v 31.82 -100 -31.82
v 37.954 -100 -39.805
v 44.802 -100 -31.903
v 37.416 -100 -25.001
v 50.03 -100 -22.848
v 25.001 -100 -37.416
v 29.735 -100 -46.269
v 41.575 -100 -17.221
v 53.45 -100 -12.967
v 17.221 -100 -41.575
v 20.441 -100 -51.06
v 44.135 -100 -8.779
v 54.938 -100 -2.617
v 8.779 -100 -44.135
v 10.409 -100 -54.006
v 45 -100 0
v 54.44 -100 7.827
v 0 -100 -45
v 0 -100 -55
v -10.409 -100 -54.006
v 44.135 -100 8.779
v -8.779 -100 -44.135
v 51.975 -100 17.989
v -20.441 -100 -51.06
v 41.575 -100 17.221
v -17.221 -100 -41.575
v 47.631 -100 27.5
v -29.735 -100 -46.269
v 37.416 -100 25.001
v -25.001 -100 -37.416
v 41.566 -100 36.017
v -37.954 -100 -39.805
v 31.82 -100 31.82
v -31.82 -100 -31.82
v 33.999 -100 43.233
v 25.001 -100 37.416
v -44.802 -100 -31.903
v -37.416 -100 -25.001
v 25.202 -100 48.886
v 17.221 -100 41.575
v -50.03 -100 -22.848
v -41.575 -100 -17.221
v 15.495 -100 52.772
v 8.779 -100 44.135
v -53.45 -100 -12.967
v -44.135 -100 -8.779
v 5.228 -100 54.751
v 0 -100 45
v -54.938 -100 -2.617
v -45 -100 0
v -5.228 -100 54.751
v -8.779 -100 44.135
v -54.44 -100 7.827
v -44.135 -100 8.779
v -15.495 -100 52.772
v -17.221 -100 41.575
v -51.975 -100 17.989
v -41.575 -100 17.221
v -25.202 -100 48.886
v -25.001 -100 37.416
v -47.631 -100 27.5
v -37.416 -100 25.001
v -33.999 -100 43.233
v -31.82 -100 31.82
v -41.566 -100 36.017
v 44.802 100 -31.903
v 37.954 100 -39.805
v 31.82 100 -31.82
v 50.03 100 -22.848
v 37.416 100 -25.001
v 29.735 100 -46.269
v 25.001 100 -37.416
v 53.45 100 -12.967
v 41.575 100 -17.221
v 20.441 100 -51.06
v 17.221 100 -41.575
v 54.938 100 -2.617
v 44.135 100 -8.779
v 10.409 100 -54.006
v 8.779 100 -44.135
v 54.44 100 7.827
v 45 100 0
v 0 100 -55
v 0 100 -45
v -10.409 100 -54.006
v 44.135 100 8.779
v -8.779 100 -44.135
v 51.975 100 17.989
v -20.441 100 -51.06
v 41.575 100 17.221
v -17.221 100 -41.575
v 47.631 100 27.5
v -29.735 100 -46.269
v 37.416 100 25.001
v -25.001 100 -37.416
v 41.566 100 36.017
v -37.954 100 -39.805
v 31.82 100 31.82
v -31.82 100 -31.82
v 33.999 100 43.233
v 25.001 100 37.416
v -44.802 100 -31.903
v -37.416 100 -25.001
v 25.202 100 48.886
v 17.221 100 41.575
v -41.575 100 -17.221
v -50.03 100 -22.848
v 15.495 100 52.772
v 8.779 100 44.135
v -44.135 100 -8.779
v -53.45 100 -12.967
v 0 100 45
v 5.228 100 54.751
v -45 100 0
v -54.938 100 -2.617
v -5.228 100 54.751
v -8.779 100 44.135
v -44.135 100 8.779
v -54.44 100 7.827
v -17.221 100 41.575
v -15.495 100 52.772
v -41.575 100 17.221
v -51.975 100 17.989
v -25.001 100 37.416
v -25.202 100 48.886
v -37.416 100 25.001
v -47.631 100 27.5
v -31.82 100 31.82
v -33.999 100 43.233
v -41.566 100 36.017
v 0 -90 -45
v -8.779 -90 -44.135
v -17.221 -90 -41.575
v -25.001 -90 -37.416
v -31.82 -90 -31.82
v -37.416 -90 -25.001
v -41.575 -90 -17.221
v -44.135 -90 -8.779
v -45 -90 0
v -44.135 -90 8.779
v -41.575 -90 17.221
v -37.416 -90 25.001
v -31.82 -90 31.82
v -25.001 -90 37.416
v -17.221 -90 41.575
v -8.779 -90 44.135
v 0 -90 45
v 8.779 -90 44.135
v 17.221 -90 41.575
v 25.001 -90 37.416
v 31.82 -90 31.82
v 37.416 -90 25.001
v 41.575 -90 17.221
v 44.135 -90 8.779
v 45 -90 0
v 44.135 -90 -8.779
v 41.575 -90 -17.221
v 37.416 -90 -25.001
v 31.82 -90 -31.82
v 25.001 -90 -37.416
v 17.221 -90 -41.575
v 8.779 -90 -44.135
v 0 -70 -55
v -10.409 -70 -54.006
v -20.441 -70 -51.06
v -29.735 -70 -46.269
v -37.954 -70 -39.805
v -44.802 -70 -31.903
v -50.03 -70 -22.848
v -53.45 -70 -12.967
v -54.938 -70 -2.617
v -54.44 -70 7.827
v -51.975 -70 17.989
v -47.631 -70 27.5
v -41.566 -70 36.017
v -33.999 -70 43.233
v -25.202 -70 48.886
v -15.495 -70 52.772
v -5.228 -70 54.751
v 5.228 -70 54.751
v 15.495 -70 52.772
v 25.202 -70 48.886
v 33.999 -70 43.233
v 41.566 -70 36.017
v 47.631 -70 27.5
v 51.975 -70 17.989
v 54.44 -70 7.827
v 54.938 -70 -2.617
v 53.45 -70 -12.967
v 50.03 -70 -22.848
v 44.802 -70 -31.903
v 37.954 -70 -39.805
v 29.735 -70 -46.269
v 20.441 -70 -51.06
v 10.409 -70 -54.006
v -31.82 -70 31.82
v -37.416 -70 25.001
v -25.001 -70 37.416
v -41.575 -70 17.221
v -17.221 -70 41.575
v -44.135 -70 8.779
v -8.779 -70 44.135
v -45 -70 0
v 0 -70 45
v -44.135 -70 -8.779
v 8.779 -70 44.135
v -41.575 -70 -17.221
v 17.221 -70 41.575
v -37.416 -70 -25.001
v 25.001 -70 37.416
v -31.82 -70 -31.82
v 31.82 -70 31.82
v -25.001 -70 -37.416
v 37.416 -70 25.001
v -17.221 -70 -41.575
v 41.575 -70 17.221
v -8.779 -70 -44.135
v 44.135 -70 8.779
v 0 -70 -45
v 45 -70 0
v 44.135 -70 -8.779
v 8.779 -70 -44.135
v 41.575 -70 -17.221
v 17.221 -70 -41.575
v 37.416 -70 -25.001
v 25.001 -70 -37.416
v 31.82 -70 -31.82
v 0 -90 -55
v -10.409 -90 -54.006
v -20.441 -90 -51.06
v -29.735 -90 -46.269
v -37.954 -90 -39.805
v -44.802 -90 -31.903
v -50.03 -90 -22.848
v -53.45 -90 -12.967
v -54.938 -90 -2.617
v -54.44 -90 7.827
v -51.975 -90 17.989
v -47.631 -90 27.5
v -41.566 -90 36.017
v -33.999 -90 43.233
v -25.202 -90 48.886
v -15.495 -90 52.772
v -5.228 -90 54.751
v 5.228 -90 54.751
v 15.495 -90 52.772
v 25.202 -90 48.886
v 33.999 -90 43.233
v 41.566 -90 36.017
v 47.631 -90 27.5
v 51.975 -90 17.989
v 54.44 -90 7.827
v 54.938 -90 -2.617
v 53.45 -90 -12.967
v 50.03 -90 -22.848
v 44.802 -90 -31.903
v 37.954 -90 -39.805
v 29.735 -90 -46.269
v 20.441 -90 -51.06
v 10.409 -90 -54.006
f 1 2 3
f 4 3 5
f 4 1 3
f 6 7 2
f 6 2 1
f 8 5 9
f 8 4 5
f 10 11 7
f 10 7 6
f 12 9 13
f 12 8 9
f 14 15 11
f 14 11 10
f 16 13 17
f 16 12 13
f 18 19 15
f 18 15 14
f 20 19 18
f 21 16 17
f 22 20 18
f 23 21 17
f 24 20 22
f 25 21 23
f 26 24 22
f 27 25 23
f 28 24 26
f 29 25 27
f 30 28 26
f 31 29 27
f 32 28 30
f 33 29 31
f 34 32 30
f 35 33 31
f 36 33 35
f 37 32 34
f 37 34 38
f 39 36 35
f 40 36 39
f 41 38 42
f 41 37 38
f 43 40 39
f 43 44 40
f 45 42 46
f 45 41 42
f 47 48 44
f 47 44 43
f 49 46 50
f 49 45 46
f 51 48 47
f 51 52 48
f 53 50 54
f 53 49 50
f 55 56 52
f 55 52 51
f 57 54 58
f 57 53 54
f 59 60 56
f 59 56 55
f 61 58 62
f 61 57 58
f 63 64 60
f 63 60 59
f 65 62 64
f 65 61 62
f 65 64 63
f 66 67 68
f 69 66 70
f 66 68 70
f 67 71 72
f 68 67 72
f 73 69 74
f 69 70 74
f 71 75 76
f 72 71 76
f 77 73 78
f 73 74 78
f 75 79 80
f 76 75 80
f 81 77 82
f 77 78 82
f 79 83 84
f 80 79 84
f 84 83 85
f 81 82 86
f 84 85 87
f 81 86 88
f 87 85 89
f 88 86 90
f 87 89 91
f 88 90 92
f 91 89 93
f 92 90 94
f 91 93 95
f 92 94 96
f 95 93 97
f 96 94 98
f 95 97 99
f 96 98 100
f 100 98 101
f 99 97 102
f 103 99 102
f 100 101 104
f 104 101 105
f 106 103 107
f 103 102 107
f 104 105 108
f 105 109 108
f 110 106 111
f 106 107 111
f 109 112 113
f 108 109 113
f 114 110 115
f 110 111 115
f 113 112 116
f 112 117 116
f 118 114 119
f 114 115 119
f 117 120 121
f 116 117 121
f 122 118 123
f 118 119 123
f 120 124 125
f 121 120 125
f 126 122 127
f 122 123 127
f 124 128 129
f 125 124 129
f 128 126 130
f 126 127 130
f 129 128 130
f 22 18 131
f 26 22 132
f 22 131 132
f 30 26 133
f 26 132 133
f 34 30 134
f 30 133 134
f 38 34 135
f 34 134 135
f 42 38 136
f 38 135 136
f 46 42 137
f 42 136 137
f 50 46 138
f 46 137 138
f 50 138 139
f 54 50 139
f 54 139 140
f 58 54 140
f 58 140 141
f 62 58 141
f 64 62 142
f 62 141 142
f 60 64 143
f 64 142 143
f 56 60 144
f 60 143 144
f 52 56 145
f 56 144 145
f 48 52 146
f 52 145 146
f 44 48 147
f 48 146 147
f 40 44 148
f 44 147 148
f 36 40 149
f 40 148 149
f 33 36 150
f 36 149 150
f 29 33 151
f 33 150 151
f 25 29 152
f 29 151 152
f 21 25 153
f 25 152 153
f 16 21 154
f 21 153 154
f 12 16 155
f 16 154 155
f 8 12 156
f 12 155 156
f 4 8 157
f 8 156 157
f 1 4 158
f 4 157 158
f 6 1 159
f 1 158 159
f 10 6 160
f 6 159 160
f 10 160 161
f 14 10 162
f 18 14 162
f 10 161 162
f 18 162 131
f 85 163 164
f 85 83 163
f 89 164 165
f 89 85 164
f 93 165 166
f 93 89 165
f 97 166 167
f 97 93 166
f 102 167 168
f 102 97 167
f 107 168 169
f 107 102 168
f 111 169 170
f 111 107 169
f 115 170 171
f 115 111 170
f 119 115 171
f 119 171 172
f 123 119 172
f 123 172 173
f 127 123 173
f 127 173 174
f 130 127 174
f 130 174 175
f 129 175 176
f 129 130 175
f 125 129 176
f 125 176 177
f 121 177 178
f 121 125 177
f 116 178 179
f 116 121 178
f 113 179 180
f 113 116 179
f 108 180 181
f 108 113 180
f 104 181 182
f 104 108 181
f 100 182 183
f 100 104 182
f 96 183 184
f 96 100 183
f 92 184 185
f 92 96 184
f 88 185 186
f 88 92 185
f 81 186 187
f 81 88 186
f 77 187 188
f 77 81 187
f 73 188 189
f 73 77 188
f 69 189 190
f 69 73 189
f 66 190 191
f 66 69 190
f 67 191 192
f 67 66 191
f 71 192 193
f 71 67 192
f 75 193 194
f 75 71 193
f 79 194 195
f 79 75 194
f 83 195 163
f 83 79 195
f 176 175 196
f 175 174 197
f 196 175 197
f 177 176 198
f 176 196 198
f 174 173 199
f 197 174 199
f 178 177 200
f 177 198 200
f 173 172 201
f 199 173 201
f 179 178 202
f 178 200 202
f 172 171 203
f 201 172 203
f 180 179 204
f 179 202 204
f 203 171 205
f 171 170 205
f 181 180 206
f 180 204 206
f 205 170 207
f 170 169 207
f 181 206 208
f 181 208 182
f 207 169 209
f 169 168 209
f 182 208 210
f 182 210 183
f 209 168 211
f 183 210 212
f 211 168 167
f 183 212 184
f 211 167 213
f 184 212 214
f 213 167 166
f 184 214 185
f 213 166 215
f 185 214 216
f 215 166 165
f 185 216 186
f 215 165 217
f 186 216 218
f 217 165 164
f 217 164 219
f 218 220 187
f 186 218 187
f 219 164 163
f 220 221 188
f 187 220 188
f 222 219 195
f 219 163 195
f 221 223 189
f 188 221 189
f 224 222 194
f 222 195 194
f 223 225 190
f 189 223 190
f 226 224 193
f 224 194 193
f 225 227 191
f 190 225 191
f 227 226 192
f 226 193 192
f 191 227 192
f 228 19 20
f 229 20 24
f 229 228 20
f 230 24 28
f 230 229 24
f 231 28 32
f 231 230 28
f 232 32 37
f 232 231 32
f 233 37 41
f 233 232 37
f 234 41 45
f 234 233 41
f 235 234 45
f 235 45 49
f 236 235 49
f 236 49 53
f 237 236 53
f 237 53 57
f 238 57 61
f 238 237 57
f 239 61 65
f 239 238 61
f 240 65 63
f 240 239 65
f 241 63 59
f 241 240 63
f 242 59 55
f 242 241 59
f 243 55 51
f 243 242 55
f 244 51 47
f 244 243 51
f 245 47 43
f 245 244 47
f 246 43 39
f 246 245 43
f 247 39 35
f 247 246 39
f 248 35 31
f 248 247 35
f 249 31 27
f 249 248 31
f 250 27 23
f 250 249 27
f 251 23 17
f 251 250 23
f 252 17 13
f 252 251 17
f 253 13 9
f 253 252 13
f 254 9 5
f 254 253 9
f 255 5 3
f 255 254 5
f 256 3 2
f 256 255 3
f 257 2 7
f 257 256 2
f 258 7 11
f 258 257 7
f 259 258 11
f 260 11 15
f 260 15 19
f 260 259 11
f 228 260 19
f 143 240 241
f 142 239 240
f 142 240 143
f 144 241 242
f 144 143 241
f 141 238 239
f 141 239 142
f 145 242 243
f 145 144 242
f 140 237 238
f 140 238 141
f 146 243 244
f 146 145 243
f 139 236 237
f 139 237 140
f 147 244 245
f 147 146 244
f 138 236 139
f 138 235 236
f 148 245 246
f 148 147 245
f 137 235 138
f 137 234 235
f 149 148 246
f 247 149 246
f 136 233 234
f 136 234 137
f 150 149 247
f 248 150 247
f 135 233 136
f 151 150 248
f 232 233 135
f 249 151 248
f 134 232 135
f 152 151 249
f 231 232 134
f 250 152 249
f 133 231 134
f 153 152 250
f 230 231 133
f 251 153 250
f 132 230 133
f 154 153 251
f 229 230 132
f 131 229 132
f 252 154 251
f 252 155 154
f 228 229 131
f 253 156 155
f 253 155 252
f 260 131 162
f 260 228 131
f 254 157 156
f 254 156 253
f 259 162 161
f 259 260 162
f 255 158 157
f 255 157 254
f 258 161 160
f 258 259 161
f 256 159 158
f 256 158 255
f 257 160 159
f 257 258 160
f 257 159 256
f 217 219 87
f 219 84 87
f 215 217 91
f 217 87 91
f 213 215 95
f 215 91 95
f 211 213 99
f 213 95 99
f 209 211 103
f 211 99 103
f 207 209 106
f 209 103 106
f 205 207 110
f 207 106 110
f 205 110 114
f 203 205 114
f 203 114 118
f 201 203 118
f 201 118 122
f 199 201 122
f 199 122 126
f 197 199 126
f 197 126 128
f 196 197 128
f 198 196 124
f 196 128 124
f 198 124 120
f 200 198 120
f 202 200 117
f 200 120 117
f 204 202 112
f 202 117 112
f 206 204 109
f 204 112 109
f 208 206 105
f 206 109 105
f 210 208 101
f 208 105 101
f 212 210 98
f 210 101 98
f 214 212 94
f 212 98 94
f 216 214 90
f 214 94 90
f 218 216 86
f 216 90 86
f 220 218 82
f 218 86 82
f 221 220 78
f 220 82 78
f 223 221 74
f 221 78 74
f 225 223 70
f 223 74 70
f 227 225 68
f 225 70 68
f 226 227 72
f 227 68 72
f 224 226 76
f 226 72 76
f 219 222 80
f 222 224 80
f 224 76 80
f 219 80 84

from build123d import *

# Parameters (mm, degrees)
SKETCH_1_W            = 10
SKETCH_1_H            = 200
THICKEN_START         = -90
THICKEN_1_OUTLINE_R   = 55
THICKEN_1_OUTLINE_R_2 = 45
THICKEN_1_DEPTH       = 20


# Read off the part's stored shape, not the designer's step: Вырез-Придать толщину1
with BuildPart() as part:
    # Эскиз1 → Повернуть1 (revolve)
    with BuildSketch(Plane.XY, mode=Mode.PRIVATE) as revolve_1_sk:
        with Locations((50, 0)):
            Rectangle(SKETCH_1_W, SKETCH_1_H)
    revolve(revolve_1_sk.sketch.rotate(Axis((0, -110.603092707, 0), (0, 1, 0)), 90), axis=Axis((0, -110.603092707, 0), (0, 1, 0)))

    # Вырез-Придать толщину1 outline → Вырез-Придать толщину1 (cut)
    with BuildSketch(Plane(origin=(0, 0, 0), x_dir=(1, 0, 0), z_dir=(0, 1, 0)).offset(THICKEN_START)):
        Circle(THICKEN_1_OUTLINE_R)
        Circle(THICKEN_1_OUTLINE_R_2, mode=Mode.SUBTRACT)
    extrude(amount=THICKEN_1_DEPTH, mode=Mode.SUBTRACT)


solid = part.part
